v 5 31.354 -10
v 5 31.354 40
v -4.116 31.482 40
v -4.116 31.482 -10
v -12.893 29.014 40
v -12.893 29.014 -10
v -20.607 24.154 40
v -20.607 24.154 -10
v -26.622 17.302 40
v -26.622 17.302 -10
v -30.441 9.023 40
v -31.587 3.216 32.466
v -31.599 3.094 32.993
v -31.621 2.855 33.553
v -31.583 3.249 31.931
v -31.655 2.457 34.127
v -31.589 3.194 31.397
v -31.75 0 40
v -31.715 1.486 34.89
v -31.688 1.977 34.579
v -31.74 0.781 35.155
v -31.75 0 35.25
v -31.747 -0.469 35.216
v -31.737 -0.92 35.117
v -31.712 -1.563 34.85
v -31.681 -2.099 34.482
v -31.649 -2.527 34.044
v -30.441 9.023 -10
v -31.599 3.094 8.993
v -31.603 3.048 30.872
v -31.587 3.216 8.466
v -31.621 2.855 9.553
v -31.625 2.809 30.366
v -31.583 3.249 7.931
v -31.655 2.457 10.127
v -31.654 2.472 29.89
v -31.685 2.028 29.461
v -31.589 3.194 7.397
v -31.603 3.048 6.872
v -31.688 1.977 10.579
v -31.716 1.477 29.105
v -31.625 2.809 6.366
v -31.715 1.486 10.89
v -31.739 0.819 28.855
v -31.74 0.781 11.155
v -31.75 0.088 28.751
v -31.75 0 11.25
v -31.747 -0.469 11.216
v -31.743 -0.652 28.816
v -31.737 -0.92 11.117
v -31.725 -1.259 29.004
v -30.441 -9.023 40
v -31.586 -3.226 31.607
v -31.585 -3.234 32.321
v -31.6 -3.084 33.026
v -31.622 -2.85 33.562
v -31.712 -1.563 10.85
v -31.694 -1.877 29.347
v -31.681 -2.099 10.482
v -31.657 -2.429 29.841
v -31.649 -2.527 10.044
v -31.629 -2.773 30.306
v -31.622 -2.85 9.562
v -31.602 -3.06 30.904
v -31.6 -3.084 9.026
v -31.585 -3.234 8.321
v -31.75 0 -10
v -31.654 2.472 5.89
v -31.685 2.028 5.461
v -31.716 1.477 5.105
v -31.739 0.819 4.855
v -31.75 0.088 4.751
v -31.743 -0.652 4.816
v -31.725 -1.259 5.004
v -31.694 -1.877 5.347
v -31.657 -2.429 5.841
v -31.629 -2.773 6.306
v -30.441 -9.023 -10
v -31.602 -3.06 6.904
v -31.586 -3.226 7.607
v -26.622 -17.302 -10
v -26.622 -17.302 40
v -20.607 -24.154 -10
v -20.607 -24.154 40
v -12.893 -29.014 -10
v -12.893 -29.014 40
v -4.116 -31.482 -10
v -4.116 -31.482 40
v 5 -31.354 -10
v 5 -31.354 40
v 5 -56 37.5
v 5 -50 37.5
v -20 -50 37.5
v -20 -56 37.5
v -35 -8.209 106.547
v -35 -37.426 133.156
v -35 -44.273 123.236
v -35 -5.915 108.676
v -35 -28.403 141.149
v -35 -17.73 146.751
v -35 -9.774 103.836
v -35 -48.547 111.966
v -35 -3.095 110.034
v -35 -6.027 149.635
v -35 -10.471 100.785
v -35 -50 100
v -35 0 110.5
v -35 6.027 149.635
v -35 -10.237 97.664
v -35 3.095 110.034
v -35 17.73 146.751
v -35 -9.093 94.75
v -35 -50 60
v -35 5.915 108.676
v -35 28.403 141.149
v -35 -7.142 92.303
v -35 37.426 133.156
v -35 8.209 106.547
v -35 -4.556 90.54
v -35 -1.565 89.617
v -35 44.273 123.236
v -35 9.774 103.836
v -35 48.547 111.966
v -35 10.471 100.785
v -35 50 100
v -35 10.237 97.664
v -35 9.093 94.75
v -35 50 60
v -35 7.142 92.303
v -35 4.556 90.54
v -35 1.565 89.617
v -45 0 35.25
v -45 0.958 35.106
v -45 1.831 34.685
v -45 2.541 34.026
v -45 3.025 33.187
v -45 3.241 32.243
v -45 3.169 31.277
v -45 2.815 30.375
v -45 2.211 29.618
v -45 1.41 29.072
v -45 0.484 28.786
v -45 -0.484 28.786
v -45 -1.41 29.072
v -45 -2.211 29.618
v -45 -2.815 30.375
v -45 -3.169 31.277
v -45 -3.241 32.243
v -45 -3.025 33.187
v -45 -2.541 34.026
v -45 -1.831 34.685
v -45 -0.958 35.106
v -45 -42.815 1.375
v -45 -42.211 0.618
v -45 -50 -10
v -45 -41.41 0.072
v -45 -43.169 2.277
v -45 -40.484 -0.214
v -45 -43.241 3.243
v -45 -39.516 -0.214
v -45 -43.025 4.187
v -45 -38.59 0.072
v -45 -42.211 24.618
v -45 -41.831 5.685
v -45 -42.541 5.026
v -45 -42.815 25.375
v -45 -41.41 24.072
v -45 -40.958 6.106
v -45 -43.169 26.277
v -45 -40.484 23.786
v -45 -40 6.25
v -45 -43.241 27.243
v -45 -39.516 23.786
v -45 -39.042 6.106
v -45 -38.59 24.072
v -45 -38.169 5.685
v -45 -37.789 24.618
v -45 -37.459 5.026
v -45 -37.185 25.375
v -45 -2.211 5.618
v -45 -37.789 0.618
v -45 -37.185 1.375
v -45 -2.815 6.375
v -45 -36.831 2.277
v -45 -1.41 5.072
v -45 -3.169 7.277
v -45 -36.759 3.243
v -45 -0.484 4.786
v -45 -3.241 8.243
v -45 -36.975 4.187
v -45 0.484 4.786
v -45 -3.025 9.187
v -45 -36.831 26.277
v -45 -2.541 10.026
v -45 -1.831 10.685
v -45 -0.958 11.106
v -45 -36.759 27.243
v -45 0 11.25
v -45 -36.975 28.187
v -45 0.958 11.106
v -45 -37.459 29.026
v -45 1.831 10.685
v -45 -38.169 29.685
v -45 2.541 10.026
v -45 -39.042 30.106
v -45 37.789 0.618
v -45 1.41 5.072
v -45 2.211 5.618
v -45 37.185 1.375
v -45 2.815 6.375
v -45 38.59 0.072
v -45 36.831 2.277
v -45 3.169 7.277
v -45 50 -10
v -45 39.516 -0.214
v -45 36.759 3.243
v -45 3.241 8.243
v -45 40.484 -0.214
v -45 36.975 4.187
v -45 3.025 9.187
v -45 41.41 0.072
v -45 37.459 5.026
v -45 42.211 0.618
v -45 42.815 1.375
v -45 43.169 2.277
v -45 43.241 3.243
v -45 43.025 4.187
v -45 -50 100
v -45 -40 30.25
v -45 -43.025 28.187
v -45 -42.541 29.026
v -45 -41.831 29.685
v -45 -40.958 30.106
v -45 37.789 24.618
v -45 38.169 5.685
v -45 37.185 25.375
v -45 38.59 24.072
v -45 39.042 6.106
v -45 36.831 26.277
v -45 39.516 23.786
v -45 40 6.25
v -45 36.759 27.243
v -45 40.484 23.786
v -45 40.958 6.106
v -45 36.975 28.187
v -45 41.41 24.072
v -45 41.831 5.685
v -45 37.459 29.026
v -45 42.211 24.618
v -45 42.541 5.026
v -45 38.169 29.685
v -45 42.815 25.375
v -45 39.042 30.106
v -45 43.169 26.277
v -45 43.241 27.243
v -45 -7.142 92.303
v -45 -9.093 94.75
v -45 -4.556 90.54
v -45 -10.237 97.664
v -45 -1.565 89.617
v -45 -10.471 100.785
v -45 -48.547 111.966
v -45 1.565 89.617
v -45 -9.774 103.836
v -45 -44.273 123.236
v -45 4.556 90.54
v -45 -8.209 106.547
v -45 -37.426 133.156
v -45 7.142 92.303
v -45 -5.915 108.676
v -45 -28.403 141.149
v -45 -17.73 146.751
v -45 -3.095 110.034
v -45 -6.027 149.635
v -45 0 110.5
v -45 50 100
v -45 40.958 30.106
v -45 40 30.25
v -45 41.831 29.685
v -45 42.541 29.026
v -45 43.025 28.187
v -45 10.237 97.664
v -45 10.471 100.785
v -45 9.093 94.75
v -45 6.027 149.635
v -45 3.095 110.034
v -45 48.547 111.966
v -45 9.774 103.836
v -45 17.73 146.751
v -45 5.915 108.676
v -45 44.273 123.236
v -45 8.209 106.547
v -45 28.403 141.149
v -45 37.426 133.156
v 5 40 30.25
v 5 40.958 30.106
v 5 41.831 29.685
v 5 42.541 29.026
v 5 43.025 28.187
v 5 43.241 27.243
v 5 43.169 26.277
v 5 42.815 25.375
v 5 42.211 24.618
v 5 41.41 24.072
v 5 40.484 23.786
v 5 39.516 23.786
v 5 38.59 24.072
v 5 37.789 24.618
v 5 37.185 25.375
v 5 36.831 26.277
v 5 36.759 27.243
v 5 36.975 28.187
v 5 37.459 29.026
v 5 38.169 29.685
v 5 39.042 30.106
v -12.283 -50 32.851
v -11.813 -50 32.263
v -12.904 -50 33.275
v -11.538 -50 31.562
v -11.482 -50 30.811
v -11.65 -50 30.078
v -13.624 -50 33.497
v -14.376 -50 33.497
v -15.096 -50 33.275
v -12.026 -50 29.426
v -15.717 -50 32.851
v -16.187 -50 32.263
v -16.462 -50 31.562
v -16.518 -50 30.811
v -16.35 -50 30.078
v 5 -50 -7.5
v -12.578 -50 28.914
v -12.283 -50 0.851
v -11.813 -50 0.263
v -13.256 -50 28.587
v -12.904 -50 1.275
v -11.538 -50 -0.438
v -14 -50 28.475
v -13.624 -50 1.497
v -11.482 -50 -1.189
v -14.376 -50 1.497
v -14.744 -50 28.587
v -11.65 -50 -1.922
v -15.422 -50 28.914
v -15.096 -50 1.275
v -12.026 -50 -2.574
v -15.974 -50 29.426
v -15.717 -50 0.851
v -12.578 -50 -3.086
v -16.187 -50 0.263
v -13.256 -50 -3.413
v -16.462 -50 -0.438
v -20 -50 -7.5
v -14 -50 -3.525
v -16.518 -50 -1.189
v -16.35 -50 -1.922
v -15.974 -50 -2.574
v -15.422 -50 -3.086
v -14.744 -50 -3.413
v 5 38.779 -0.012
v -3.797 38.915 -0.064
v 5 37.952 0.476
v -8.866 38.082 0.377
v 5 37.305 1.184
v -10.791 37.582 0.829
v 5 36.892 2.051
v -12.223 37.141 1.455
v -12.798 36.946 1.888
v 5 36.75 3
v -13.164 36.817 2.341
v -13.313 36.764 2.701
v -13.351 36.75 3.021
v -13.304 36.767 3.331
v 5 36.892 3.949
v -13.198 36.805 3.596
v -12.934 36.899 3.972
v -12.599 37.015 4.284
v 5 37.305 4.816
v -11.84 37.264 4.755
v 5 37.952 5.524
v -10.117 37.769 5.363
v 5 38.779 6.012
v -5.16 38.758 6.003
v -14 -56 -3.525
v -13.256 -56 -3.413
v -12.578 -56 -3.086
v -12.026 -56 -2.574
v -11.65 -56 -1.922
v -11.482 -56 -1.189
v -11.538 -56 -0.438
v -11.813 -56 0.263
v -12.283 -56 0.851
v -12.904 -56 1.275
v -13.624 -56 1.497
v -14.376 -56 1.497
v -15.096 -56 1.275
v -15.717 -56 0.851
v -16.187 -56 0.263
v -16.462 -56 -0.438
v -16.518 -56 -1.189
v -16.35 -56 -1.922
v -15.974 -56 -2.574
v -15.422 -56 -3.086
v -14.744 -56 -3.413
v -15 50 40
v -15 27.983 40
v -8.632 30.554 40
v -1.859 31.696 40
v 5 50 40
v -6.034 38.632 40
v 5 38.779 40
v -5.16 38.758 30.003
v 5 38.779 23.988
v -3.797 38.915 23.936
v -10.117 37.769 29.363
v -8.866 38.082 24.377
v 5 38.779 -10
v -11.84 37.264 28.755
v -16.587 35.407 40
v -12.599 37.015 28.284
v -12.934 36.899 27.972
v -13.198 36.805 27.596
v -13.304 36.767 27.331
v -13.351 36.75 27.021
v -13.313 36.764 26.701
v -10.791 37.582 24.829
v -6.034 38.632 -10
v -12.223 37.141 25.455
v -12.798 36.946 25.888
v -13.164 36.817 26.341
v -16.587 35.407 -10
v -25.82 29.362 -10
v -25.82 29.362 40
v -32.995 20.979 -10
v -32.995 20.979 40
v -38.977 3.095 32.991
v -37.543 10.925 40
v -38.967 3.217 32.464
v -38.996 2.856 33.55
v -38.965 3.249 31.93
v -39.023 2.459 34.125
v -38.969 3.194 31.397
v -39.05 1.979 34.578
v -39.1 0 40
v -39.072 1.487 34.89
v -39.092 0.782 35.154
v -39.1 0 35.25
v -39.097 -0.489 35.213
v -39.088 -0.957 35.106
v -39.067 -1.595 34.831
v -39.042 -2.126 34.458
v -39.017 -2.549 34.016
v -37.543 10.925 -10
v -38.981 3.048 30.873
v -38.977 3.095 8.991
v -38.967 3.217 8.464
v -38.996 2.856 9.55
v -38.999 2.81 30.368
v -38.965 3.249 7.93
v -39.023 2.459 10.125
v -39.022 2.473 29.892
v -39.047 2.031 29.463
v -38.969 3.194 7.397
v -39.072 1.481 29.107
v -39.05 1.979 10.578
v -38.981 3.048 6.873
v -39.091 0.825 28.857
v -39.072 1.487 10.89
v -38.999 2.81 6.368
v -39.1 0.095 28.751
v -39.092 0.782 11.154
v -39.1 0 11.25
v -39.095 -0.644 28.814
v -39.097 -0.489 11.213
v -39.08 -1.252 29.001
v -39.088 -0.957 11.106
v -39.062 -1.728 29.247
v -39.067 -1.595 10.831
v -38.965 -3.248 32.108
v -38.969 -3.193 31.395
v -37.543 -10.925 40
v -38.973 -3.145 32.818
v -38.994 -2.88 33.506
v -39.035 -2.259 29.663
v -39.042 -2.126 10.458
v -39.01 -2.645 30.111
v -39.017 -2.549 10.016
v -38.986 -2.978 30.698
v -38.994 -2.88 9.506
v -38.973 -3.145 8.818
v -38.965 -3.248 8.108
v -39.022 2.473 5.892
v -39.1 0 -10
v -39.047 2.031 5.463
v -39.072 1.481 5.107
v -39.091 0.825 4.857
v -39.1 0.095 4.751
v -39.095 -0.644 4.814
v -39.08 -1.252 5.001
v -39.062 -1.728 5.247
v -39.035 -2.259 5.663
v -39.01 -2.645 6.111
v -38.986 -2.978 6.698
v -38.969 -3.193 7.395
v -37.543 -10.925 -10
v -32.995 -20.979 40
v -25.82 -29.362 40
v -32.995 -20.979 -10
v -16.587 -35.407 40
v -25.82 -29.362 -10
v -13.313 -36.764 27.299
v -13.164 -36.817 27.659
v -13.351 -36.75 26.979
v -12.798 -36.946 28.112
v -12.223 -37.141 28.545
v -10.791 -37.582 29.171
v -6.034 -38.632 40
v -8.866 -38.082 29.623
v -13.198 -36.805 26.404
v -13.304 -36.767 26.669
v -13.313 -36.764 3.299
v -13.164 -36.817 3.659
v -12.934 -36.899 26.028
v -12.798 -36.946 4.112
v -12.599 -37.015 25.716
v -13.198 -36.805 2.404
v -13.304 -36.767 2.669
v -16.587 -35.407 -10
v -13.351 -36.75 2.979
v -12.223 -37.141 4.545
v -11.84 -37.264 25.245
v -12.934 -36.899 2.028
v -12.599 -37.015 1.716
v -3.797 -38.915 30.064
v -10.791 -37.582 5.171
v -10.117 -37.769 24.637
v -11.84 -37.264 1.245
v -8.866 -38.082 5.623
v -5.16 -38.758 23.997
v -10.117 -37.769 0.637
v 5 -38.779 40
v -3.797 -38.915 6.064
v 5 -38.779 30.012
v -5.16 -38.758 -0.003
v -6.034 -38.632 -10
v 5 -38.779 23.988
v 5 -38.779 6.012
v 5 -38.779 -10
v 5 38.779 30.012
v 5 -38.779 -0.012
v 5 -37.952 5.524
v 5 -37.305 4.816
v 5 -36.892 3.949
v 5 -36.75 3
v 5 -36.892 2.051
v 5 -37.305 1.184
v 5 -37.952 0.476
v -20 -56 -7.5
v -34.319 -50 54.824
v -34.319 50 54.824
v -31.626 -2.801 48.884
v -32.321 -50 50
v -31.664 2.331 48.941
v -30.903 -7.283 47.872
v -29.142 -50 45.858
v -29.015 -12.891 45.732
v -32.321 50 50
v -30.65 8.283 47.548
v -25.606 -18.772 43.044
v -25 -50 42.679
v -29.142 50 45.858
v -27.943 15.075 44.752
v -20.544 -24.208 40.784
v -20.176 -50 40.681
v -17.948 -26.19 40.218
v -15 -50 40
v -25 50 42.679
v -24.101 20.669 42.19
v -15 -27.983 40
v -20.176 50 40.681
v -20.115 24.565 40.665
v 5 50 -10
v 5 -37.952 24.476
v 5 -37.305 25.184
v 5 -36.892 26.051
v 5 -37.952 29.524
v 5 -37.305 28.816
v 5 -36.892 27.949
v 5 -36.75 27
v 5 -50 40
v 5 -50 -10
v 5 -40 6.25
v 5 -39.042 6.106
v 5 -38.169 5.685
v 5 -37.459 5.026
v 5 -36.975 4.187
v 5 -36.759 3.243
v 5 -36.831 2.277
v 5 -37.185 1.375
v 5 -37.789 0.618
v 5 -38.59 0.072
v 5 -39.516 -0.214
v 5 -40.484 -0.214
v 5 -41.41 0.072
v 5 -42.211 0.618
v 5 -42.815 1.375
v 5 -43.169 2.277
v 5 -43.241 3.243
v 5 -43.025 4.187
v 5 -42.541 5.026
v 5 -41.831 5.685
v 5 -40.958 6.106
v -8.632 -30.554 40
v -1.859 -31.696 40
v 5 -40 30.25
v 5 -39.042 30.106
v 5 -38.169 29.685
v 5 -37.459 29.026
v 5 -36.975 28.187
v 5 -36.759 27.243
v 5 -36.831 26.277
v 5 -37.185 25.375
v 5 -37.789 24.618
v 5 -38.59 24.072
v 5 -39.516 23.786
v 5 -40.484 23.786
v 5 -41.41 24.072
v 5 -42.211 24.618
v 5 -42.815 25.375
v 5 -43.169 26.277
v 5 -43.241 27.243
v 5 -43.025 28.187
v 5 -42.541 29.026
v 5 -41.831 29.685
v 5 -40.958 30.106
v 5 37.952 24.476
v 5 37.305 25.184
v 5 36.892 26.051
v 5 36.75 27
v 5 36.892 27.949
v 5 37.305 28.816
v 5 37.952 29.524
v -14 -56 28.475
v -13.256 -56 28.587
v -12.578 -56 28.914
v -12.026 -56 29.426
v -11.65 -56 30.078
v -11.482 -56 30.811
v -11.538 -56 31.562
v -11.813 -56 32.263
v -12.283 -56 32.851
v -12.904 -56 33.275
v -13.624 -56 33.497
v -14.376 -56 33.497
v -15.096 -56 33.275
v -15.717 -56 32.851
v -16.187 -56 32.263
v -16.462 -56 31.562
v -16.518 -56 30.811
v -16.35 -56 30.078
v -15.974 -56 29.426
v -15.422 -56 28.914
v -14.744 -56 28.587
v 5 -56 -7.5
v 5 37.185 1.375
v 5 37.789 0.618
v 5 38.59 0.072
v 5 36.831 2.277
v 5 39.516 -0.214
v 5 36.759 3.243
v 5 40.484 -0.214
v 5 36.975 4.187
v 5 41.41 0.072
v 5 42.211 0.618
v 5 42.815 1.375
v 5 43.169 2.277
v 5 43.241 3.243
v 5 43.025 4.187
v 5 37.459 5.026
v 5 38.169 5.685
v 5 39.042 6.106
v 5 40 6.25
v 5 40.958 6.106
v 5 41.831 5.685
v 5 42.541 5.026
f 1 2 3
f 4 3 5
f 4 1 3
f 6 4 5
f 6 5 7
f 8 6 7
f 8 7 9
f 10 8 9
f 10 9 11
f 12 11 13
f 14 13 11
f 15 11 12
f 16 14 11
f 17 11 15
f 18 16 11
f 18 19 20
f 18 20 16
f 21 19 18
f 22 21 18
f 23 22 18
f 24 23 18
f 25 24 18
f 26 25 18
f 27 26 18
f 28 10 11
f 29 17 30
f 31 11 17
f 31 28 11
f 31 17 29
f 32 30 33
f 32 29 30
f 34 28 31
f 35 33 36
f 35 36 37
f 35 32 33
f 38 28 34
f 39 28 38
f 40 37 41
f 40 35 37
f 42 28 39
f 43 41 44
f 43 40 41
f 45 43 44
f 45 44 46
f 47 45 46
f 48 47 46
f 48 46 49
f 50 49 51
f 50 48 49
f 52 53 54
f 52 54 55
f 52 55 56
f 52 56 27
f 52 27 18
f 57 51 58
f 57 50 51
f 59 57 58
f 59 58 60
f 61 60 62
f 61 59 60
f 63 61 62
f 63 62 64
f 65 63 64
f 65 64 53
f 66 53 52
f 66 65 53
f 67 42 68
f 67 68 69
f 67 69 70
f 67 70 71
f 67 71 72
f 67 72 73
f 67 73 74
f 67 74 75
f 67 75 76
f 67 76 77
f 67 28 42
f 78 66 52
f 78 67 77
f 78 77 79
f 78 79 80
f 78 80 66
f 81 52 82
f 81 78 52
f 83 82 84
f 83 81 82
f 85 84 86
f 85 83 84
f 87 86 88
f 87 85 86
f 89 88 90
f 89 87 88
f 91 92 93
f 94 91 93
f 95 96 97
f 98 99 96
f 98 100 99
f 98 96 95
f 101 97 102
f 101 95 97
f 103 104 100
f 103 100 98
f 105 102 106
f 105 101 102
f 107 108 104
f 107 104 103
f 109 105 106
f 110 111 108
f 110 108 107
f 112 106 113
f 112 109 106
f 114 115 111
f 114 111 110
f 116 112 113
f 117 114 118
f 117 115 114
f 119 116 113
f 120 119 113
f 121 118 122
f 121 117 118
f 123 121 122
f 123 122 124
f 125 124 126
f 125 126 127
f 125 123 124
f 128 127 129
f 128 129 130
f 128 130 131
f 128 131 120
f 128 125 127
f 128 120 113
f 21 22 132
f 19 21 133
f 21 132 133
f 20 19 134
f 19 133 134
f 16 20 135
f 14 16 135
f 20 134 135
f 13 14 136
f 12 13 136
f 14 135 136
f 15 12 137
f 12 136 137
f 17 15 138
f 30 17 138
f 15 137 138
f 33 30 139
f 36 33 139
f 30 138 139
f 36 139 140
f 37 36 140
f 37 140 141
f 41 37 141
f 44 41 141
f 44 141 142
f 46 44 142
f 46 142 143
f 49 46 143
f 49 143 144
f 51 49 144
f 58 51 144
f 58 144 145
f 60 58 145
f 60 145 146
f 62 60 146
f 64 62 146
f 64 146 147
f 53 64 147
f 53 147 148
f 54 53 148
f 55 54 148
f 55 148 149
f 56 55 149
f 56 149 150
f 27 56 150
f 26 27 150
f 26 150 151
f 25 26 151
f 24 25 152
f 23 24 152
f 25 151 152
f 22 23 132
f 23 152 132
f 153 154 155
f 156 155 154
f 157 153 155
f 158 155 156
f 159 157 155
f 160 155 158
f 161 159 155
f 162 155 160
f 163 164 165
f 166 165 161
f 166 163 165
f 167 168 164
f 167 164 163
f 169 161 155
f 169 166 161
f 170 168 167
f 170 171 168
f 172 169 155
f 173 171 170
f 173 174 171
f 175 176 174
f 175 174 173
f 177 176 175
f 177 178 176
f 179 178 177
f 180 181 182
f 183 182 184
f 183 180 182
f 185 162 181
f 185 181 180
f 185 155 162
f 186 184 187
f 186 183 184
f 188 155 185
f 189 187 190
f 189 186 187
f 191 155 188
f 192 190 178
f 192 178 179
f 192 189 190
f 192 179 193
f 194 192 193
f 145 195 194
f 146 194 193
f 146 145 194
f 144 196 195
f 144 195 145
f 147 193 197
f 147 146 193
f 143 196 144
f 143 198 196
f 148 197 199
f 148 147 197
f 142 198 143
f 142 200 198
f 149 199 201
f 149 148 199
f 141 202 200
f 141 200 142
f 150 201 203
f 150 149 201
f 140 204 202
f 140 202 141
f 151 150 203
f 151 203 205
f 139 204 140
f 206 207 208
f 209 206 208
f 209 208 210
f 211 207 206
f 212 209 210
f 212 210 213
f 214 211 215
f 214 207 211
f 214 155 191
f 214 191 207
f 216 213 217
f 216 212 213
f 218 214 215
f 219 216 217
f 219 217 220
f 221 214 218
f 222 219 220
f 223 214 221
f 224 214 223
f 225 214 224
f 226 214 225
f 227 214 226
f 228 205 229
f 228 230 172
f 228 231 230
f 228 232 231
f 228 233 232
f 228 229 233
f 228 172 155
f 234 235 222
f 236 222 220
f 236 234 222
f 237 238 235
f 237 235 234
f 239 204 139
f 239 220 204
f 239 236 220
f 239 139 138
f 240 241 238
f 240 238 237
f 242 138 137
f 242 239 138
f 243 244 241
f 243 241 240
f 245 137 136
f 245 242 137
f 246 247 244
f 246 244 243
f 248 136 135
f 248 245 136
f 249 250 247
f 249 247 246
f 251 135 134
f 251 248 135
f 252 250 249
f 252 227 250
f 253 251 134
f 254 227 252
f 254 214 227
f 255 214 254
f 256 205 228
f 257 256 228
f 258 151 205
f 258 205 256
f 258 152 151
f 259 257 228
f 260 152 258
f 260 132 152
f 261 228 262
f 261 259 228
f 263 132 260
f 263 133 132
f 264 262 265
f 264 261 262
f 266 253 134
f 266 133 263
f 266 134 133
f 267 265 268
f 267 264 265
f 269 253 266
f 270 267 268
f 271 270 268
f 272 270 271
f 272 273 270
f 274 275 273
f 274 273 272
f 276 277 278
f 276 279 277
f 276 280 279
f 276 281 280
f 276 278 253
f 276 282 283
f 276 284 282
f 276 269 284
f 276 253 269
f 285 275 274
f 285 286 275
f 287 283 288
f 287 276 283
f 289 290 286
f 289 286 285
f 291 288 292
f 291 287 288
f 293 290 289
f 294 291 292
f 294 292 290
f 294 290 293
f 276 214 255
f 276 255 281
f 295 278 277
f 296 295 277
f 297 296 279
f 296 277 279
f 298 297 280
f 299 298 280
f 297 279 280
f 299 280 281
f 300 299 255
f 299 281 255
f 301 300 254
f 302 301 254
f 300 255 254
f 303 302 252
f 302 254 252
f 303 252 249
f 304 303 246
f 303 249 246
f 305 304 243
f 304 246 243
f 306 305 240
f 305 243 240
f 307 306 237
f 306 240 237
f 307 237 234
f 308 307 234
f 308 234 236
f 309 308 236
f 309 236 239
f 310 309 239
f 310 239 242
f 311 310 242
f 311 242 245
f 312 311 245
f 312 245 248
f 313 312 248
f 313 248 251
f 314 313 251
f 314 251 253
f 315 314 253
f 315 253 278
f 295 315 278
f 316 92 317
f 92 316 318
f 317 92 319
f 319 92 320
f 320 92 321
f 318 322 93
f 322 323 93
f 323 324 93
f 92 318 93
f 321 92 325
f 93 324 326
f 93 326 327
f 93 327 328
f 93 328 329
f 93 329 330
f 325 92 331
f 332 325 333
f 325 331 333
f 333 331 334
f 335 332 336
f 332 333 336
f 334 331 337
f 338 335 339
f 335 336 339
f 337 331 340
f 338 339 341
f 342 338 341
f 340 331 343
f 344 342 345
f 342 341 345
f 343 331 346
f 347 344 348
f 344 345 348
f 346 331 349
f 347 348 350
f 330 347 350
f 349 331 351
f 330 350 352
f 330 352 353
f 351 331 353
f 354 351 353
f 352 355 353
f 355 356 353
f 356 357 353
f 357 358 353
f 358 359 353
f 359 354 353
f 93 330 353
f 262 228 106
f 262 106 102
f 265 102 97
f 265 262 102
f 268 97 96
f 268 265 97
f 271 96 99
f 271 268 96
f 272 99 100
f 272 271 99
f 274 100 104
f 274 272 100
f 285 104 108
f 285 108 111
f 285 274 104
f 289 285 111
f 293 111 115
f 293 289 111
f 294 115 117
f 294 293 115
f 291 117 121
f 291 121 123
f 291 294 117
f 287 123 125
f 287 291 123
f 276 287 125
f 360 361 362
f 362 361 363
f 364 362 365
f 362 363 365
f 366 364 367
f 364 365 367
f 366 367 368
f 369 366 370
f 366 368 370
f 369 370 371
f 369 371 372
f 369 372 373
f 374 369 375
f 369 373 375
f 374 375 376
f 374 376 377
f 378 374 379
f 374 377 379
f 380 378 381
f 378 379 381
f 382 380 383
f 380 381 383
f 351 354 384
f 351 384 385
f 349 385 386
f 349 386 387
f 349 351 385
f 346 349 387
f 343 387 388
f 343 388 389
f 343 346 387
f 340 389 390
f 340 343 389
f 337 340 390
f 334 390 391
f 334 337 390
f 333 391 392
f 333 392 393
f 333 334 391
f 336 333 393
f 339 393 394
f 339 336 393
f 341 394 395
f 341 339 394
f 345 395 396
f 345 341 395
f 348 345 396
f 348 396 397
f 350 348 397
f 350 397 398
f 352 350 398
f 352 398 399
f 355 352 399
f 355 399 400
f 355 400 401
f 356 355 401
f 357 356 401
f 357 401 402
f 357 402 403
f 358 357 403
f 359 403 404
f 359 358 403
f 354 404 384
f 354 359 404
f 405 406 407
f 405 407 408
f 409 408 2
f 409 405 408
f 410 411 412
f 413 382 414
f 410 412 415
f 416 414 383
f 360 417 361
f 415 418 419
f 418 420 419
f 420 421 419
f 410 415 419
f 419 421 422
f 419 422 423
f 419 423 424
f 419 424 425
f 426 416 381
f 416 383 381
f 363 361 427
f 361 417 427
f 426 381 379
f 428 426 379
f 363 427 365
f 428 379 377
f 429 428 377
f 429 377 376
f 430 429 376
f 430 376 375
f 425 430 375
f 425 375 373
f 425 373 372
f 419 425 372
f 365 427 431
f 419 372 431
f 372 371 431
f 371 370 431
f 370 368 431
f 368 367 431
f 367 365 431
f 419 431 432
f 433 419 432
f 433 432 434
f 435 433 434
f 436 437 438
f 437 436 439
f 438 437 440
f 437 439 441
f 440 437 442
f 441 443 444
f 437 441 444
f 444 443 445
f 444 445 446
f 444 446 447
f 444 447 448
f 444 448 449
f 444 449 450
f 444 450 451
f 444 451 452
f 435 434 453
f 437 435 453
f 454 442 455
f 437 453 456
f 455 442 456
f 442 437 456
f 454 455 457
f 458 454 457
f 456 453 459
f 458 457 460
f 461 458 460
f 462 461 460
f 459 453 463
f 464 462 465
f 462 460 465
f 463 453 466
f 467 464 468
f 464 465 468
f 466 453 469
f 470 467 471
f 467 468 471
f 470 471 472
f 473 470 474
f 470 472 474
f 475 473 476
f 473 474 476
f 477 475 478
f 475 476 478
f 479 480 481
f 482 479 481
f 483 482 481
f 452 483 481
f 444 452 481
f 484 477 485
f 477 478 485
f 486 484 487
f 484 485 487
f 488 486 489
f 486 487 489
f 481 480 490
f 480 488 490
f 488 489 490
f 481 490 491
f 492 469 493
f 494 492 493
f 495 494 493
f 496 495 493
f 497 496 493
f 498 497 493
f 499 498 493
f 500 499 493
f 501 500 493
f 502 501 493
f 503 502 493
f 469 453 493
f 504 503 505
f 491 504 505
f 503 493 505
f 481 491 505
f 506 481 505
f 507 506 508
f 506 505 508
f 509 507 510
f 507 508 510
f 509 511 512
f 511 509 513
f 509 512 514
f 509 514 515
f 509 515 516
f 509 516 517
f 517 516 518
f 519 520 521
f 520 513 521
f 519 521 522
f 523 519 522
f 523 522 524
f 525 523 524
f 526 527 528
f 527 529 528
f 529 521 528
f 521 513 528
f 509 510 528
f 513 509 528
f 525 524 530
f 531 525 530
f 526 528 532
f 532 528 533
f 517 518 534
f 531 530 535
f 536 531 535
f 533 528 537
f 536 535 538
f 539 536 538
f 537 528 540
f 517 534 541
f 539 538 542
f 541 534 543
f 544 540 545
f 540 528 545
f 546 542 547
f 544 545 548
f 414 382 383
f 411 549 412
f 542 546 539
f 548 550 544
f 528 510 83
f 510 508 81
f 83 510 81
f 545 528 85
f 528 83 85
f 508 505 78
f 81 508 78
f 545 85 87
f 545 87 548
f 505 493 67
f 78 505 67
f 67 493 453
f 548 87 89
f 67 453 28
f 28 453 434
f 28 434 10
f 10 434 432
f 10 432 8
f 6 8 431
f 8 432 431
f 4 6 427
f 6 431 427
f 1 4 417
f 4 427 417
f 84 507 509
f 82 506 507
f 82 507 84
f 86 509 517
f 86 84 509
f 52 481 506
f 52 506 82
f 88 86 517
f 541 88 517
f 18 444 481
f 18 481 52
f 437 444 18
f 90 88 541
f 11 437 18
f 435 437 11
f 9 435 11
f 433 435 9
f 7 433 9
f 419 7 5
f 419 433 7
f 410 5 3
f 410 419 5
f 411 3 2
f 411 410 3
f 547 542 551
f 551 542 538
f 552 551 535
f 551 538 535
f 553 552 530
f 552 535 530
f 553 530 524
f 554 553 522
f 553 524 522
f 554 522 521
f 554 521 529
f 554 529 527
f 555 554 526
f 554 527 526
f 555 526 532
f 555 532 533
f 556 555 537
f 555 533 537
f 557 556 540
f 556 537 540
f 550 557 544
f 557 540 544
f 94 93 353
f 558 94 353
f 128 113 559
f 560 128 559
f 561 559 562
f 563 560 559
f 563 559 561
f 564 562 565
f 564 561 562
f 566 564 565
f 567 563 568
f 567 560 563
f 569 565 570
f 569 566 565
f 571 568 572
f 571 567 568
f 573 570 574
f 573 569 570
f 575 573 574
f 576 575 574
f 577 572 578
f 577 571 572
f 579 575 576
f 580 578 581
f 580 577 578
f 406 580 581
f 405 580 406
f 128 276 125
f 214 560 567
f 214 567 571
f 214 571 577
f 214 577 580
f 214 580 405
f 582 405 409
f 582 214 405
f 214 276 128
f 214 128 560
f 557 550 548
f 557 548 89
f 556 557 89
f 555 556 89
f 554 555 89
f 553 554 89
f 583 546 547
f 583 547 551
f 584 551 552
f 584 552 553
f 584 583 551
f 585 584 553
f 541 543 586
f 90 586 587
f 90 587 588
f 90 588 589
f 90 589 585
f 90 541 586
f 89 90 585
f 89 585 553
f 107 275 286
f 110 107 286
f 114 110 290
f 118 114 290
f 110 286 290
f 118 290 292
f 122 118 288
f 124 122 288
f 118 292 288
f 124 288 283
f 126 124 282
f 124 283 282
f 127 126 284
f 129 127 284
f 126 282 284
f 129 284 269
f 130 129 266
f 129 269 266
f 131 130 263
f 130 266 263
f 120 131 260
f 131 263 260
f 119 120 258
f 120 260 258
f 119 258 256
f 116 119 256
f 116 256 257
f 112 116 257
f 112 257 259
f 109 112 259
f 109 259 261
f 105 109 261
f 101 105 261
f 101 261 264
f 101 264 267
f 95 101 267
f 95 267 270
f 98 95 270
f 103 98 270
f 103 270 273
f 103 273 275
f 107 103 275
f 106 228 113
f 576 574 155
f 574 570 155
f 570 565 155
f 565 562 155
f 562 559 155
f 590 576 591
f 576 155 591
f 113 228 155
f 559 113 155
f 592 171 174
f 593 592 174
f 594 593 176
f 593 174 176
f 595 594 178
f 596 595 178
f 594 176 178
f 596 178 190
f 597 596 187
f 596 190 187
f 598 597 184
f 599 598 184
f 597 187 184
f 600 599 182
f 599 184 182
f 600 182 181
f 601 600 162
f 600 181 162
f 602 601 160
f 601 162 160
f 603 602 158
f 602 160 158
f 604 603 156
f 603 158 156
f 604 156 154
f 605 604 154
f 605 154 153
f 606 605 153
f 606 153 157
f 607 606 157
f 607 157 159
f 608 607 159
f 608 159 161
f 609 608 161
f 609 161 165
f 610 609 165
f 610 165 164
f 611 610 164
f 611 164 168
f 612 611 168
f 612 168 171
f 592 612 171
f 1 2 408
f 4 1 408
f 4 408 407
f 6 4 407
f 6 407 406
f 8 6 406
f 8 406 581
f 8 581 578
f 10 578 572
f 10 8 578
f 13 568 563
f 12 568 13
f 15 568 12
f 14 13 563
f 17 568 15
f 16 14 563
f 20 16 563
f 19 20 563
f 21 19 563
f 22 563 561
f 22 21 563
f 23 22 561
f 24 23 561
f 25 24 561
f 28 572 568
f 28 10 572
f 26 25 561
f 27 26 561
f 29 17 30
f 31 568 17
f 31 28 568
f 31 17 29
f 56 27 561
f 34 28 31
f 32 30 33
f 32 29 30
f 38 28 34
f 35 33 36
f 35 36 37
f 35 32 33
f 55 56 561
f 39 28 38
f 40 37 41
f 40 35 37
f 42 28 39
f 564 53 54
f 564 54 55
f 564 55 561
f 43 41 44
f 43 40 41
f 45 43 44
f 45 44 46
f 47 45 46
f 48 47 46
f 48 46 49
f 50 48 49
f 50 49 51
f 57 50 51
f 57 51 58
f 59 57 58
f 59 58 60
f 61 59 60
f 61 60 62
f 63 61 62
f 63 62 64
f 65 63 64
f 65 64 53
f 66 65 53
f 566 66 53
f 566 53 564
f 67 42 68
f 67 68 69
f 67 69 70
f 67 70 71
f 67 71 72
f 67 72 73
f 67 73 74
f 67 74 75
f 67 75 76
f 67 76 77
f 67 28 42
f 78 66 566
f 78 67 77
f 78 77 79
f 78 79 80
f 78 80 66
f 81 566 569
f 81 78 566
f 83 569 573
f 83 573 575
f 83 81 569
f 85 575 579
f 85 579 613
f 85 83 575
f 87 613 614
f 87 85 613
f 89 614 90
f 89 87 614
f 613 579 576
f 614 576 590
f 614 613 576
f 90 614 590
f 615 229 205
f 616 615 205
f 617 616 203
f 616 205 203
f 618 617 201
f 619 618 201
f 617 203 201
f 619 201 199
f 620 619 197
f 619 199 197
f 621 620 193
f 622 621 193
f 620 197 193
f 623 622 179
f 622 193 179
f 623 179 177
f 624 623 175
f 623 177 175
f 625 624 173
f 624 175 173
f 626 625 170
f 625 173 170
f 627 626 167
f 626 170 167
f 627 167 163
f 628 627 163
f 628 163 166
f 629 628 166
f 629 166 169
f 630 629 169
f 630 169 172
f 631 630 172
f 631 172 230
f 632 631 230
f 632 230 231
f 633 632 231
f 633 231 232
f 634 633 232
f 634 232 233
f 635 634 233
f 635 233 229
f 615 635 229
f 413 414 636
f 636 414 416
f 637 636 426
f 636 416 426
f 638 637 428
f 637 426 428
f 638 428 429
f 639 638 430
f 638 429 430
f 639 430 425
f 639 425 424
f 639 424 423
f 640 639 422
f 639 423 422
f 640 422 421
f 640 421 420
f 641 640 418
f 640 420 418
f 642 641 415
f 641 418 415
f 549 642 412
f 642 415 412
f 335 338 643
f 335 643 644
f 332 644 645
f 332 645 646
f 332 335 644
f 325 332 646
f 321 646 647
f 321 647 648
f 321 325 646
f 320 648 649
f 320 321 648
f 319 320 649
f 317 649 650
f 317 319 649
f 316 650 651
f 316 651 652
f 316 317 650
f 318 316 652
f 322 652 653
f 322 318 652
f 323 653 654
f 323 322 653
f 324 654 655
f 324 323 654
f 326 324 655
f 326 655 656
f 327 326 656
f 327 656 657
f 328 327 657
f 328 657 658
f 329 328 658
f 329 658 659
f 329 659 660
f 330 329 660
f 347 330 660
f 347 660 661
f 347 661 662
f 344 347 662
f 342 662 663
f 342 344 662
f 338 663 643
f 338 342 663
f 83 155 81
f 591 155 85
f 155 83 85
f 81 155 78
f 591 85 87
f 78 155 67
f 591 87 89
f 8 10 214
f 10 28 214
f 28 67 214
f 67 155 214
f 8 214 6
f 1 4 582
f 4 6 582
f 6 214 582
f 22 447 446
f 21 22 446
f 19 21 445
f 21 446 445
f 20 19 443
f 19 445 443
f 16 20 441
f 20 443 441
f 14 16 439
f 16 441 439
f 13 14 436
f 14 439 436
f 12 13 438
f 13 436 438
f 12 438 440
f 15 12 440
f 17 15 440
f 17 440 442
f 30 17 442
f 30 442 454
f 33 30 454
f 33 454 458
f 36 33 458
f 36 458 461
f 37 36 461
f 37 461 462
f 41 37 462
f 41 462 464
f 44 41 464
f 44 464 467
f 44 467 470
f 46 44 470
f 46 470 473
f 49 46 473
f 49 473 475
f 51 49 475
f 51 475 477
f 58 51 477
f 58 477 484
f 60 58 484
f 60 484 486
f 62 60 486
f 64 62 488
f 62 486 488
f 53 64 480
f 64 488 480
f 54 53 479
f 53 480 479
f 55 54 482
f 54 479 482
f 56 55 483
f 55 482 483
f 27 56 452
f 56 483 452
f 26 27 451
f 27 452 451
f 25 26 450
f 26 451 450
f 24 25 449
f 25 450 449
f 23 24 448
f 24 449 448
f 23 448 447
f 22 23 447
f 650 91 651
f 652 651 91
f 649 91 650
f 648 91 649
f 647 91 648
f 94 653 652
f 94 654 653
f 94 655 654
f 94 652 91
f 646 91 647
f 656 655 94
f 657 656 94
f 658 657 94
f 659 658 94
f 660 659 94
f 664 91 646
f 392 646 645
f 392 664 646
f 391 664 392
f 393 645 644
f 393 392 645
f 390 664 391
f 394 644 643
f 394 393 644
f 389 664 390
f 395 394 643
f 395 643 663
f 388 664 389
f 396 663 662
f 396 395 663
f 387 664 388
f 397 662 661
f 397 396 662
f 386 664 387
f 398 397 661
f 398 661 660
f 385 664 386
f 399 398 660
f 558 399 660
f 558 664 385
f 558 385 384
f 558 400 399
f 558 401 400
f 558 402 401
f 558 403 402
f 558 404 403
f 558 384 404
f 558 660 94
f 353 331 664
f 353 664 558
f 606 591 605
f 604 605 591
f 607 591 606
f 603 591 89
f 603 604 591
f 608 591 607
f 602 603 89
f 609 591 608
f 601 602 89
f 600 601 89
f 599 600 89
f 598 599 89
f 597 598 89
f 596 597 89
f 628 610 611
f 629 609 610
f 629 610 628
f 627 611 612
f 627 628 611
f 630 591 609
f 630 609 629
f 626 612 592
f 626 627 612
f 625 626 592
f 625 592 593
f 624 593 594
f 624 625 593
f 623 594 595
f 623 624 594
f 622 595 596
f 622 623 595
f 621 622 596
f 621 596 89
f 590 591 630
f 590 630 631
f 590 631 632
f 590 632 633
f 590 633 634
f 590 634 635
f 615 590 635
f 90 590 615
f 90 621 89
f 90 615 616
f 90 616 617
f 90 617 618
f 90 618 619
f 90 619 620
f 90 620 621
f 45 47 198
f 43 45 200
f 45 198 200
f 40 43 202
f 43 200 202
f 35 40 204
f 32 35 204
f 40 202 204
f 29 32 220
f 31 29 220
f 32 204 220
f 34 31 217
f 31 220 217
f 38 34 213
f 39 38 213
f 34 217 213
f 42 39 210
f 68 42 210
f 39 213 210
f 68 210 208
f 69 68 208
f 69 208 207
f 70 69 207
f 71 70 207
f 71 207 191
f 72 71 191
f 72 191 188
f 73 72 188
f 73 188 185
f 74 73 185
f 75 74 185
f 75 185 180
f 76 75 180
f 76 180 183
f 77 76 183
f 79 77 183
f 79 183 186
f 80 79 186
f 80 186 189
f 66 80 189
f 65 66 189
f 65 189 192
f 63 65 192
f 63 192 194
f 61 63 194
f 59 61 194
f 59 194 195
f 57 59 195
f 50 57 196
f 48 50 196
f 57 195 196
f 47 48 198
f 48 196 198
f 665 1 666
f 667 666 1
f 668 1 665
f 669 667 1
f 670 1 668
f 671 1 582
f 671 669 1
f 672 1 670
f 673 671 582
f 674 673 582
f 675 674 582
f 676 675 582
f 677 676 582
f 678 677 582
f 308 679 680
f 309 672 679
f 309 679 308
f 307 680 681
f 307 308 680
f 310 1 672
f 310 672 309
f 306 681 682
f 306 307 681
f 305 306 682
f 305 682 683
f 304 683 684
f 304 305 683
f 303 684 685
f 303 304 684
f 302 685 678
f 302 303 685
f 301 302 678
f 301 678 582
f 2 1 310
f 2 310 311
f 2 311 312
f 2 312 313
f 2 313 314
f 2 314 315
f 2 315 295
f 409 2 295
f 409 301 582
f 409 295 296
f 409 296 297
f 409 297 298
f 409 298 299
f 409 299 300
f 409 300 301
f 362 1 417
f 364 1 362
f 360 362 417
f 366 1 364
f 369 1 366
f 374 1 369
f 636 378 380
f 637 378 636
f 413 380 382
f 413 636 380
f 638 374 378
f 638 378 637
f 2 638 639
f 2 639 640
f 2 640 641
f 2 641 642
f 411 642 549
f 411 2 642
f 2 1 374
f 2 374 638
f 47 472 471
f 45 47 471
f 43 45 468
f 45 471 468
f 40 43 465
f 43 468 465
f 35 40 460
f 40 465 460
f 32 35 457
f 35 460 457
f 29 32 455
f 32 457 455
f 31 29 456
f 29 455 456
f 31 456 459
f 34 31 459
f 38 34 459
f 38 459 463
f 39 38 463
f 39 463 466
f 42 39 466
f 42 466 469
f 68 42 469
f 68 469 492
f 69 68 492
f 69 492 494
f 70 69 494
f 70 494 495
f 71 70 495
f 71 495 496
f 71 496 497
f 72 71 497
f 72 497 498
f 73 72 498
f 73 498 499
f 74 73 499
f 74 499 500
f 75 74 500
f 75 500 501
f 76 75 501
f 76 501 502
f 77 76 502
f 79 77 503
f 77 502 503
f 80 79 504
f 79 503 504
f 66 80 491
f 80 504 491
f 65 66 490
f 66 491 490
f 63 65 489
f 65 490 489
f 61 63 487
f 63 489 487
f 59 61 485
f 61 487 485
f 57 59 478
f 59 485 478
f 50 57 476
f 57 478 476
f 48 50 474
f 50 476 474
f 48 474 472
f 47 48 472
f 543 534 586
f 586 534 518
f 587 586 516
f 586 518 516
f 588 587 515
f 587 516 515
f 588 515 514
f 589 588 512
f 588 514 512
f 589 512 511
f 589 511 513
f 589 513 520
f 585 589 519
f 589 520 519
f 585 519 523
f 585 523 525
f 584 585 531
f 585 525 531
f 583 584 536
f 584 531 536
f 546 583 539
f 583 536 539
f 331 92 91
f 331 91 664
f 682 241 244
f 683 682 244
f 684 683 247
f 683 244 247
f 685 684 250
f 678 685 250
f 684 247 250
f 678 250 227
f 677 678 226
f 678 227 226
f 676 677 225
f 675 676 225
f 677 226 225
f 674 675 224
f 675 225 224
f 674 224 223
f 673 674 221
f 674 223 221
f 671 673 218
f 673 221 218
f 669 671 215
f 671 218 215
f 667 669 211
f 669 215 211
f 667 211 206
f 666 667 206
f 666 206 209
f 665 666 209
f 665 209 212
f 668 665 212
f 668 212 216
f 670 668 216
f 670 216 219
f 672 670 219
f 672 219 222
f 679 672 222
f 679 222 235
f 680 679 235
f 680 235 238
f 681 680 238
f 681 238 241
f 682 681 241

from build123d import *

# Parameters (mm, degrees)
CENTRE_HOLE_FOR_L2_DEPTH      = 40
CENTRE_HOLE_FOR_L2_DEPTH_BACK = 10
SKETCH1_R                     = 39.1
SKETCH1_R_2                   = 31.75
MAIN_STRUCTURE_DEPTH          = 60
MAIN_STRUCTURE_DEPTH_BACK     = 50
SKETCH2_W                     = 90
SKETCH2_H                     = 100
SKETCH2_R                     = 31.75
BEARING_CURVE_DEPTH           = 10
SKETCH6_R                     = 10.5
SHAFT_HOLE_DEPTH              = 10
WRIST_CUTOUT_DEPTH            = 186.809041761
SURFACECUT1_START             = 5
SURFACECUT1_OUTLINE_R         = 10.5
SURFACECUT1_DEPTH             = 40
SKETCH13_W                    = 25
SKETCH13_H                    = 45
SKETCH13_R                    = 2.525
BOSS_EXTRUDE1_DEPTH           = 6
SKETCH14_R                    = 3.25
CUT_EXTRUDE2_DEPTH            = 168.7378908
SKETCH15_R                    = 3.25
CUT_EXTRUDE3_DEPTH            = 168.7378908


# Read off the part's stored shape, not the designer's step: SurfaceCut1
with BuildPart() as part:
    # Sketch1 → Centre Hole for L2 (new, two sides: drawn at the far end of the back side and taken through both)
    with BuildSketch(Plane.XY.offset(-CENTRE_HOLE_FOR_L2_DEPTH_BACK)):
        Circle(SKETCH1_R)
        Circle(SKETCH1_R_2, mode=Mode.SUBTRACT)
    extrude(amount=CENTRE_HOLE_FOR_L2_DEPTH + CENTRE_HOLE_FOR_L2_DEPTH_BACK)


with BuildPart() as body_2:
    # Sketch2 → Main Structure (new, two sides: drawn at the far end of the back side and taken through both)
    with BuildSketch(Plane.XY.offset(40).offset(-MAIN_STRUCTURE_DEPTH_BACK)):
        Rectangle(SKETCH2_W, SKETCH2_H)
        Circle(SKETCH2_R, mode=Mode.SUBTRACT)
    extrude(amount=MAIN_STRUCTURE_DEPTH + MAIN_STRUCTURE_DEPTH_BACK)

    # Sketch3 → Bearing Curve (add)
    with BuildSketch(Plane.ZY.offset(45)):
        with BuildLine():
            Line((100, 50), (100, -50))
            ThreePointArc((100, -50), (150, 0), (100, 50))
        make_face()
    bearing_curve = extrude(amount=-BEARING_CURVE_DEPTH)

    # Upright Mirror: Bearing Curve across plane
    add(bearing_curve.mirror(Plane(origin=(0, 0, 0), x_dir=(0, 0, 1), z_dir=(1, 0, 0))))

    # Sketch6 → Shaft Hole (cut)
    with BuildSketch(Plane.ZY.offset(45)):
        with Locations((100, 0)):
            Circle(SKETCH6_R)
    shaft_hole = extrude(amount=-SHAFT_HOLE_DEPTH, mode=Mode.SUBTRACT)

    # Sketch4 → Wrist Cutout (cut, through all)
    with BuildSketch(Plane(origin=(0, 50, 0), x_dir=(1, 0, 0), z_dir=(0, 1, 0))):
        with BuildLine():
            Line((-35, -100), (-35, -60))
            ThreePointArc((-35, -60), (-29.142135624, -45.857864376), (-15, -40))
            Line((-15, -40), (15, -40))
            ThreePointArc((15, -40), (29.142135624, -45.857864376), (35, -60))
            Line((35, -60), (35, -100))
            Line((35, -100), (-35, -100))
        make_face()
    extrude(amount=-WRIST_CUTOUT_DEPTH, mode=Mode.SUBTRACT)

    # Bearing Mirror: Shaft Hole across plane
    add(shaft_hole.mirror(Plane(origin=(0, 0, 0), x_dir=(0, 0, 1), z_dir=(1, 0, 0))), mode=Mode.SUBTRACT)


with BuildPart() as surfacecut1_tool:
    # SurfaceCut1 outline → SurfaceCut1 (new body)
    with BuildSketch(Plane.YZ.offset(SURFACECUT1_START)):
        with BuildLine():
            ThreePointArc((50, 100), (0, 150), (-50, 100))
            Line((-50, 100), (-50, -10))
            Line((-50, -10), (50, -10))
            Line((50, -10), (50, 100))
        make_face()
        with Locations((0, 100)):
            Circle(SURFACECUT1_OUTLINE_R, mode=Mode.SUBTRACT)
    extrude(amount=SURFACECUT1_DEPTH)


with BuildPart() as part_1:
    add(part.part)

    # SurfaceCut1: cut by surfacecut1_tool
    add(surfacecut1_tool.part, mode=Mode.SUBTRACT)


with BuildPart() as body_2_1:
    add(body_2.part)

    # SurfaceCut1: cut by surfacecut1_tool
    add(surfacecut1_tool.part, mode=Mode.SUBTRACT)


with BuildPart() as body_3:
    # Sketch13 → Boss-Extrude1 (new body)
    with BuildSketch(Plane(origin=(0, -50, 0), x_dir=(-1, 0, 0), z_dir=(0, -1, 0))):
        with Locations((7.5, -15)):
            Rectangle(SKETCH13_W, SKETCH13_H)
        with Locations(Location((14, -31, 0), (0, 0, 90))):
            Circle(SKETCH13_R, mode=Mode.SUBTRACT)
        with Locations(Location((14, 1, 0), (0, 0, 90))):
            Circle(SKETCH13_R, mode=Mode.SUBTRACT)
    extrude(amount=BOSS_EXTRUDE1_DEPTH)


with BuildPart() as cut_extrude2_tool:
    # Sketch14 → Cut-Extrude2 (new, through all)
    with BuildSketch(Plane.ZY.offset(45)):
        with Locations((8, 0)):
            Circle(SKETCH14_R)
        with Locations((32, 0)):
            Circle(SKETCH14_R)
    extrude(amount=-CUT_EXTRUDE2_DEPTH)


with BuildPart() as part_2:
    add(part_1.part)

    # Cut-Extrude2: cut by cut_extrude2_tool
    add(cut_extrude2_tool.part, mode=Mode.SUBTRACT)


with BuildPart() as body_2_2:
    add(body_2_1.part)

    # Cut-Extrude2: cut by cut_extrude2_tool
    add(cut_extrude2_tool.part, mode=Mode.SUBTRACT)


with BuildPart() as cut_extrude3_tool:
    # Sketch15 → Cut-Extrude3 (new, through all)
    with BuildSketch(Plane.ZY.offset(45)):
        with Locations((32, 0)):
            Circle(SKETCH15_R)
        with Locations((8, 0)):
            Circle(SKETCH15_R)
        with Locations((3, 40)):
            Circle(SKETCH15_R)
        with Locations((27, 40)):
            Circle(SKETCH15_R)
        with Locations((3, -40)):
            Circle(SKETCH15_R)
        with Locations((27, -40)):
            Circle(SKETCH15_R)
    extrude(amount=-CUT_EXTRUDE3_DEPTH)


with BuildPart() as part_3:
    add(part_2.part)

    # Cut-Extrude3: cut by cut_extrude3_tool
    add(cut_extrude3_tool.part, mode=Mode.SUBTRACT)


with BuildPart() as body_2_3:
    add(body_2_2.part)

    # Cut-Extrude3: cut by cut_extrude3_tool
    add(cut_extrude3_tool.part, mode=Mode.SUBTRACT)


solid = Compound([body_3.part, part_3.part, body_2_3.part])
